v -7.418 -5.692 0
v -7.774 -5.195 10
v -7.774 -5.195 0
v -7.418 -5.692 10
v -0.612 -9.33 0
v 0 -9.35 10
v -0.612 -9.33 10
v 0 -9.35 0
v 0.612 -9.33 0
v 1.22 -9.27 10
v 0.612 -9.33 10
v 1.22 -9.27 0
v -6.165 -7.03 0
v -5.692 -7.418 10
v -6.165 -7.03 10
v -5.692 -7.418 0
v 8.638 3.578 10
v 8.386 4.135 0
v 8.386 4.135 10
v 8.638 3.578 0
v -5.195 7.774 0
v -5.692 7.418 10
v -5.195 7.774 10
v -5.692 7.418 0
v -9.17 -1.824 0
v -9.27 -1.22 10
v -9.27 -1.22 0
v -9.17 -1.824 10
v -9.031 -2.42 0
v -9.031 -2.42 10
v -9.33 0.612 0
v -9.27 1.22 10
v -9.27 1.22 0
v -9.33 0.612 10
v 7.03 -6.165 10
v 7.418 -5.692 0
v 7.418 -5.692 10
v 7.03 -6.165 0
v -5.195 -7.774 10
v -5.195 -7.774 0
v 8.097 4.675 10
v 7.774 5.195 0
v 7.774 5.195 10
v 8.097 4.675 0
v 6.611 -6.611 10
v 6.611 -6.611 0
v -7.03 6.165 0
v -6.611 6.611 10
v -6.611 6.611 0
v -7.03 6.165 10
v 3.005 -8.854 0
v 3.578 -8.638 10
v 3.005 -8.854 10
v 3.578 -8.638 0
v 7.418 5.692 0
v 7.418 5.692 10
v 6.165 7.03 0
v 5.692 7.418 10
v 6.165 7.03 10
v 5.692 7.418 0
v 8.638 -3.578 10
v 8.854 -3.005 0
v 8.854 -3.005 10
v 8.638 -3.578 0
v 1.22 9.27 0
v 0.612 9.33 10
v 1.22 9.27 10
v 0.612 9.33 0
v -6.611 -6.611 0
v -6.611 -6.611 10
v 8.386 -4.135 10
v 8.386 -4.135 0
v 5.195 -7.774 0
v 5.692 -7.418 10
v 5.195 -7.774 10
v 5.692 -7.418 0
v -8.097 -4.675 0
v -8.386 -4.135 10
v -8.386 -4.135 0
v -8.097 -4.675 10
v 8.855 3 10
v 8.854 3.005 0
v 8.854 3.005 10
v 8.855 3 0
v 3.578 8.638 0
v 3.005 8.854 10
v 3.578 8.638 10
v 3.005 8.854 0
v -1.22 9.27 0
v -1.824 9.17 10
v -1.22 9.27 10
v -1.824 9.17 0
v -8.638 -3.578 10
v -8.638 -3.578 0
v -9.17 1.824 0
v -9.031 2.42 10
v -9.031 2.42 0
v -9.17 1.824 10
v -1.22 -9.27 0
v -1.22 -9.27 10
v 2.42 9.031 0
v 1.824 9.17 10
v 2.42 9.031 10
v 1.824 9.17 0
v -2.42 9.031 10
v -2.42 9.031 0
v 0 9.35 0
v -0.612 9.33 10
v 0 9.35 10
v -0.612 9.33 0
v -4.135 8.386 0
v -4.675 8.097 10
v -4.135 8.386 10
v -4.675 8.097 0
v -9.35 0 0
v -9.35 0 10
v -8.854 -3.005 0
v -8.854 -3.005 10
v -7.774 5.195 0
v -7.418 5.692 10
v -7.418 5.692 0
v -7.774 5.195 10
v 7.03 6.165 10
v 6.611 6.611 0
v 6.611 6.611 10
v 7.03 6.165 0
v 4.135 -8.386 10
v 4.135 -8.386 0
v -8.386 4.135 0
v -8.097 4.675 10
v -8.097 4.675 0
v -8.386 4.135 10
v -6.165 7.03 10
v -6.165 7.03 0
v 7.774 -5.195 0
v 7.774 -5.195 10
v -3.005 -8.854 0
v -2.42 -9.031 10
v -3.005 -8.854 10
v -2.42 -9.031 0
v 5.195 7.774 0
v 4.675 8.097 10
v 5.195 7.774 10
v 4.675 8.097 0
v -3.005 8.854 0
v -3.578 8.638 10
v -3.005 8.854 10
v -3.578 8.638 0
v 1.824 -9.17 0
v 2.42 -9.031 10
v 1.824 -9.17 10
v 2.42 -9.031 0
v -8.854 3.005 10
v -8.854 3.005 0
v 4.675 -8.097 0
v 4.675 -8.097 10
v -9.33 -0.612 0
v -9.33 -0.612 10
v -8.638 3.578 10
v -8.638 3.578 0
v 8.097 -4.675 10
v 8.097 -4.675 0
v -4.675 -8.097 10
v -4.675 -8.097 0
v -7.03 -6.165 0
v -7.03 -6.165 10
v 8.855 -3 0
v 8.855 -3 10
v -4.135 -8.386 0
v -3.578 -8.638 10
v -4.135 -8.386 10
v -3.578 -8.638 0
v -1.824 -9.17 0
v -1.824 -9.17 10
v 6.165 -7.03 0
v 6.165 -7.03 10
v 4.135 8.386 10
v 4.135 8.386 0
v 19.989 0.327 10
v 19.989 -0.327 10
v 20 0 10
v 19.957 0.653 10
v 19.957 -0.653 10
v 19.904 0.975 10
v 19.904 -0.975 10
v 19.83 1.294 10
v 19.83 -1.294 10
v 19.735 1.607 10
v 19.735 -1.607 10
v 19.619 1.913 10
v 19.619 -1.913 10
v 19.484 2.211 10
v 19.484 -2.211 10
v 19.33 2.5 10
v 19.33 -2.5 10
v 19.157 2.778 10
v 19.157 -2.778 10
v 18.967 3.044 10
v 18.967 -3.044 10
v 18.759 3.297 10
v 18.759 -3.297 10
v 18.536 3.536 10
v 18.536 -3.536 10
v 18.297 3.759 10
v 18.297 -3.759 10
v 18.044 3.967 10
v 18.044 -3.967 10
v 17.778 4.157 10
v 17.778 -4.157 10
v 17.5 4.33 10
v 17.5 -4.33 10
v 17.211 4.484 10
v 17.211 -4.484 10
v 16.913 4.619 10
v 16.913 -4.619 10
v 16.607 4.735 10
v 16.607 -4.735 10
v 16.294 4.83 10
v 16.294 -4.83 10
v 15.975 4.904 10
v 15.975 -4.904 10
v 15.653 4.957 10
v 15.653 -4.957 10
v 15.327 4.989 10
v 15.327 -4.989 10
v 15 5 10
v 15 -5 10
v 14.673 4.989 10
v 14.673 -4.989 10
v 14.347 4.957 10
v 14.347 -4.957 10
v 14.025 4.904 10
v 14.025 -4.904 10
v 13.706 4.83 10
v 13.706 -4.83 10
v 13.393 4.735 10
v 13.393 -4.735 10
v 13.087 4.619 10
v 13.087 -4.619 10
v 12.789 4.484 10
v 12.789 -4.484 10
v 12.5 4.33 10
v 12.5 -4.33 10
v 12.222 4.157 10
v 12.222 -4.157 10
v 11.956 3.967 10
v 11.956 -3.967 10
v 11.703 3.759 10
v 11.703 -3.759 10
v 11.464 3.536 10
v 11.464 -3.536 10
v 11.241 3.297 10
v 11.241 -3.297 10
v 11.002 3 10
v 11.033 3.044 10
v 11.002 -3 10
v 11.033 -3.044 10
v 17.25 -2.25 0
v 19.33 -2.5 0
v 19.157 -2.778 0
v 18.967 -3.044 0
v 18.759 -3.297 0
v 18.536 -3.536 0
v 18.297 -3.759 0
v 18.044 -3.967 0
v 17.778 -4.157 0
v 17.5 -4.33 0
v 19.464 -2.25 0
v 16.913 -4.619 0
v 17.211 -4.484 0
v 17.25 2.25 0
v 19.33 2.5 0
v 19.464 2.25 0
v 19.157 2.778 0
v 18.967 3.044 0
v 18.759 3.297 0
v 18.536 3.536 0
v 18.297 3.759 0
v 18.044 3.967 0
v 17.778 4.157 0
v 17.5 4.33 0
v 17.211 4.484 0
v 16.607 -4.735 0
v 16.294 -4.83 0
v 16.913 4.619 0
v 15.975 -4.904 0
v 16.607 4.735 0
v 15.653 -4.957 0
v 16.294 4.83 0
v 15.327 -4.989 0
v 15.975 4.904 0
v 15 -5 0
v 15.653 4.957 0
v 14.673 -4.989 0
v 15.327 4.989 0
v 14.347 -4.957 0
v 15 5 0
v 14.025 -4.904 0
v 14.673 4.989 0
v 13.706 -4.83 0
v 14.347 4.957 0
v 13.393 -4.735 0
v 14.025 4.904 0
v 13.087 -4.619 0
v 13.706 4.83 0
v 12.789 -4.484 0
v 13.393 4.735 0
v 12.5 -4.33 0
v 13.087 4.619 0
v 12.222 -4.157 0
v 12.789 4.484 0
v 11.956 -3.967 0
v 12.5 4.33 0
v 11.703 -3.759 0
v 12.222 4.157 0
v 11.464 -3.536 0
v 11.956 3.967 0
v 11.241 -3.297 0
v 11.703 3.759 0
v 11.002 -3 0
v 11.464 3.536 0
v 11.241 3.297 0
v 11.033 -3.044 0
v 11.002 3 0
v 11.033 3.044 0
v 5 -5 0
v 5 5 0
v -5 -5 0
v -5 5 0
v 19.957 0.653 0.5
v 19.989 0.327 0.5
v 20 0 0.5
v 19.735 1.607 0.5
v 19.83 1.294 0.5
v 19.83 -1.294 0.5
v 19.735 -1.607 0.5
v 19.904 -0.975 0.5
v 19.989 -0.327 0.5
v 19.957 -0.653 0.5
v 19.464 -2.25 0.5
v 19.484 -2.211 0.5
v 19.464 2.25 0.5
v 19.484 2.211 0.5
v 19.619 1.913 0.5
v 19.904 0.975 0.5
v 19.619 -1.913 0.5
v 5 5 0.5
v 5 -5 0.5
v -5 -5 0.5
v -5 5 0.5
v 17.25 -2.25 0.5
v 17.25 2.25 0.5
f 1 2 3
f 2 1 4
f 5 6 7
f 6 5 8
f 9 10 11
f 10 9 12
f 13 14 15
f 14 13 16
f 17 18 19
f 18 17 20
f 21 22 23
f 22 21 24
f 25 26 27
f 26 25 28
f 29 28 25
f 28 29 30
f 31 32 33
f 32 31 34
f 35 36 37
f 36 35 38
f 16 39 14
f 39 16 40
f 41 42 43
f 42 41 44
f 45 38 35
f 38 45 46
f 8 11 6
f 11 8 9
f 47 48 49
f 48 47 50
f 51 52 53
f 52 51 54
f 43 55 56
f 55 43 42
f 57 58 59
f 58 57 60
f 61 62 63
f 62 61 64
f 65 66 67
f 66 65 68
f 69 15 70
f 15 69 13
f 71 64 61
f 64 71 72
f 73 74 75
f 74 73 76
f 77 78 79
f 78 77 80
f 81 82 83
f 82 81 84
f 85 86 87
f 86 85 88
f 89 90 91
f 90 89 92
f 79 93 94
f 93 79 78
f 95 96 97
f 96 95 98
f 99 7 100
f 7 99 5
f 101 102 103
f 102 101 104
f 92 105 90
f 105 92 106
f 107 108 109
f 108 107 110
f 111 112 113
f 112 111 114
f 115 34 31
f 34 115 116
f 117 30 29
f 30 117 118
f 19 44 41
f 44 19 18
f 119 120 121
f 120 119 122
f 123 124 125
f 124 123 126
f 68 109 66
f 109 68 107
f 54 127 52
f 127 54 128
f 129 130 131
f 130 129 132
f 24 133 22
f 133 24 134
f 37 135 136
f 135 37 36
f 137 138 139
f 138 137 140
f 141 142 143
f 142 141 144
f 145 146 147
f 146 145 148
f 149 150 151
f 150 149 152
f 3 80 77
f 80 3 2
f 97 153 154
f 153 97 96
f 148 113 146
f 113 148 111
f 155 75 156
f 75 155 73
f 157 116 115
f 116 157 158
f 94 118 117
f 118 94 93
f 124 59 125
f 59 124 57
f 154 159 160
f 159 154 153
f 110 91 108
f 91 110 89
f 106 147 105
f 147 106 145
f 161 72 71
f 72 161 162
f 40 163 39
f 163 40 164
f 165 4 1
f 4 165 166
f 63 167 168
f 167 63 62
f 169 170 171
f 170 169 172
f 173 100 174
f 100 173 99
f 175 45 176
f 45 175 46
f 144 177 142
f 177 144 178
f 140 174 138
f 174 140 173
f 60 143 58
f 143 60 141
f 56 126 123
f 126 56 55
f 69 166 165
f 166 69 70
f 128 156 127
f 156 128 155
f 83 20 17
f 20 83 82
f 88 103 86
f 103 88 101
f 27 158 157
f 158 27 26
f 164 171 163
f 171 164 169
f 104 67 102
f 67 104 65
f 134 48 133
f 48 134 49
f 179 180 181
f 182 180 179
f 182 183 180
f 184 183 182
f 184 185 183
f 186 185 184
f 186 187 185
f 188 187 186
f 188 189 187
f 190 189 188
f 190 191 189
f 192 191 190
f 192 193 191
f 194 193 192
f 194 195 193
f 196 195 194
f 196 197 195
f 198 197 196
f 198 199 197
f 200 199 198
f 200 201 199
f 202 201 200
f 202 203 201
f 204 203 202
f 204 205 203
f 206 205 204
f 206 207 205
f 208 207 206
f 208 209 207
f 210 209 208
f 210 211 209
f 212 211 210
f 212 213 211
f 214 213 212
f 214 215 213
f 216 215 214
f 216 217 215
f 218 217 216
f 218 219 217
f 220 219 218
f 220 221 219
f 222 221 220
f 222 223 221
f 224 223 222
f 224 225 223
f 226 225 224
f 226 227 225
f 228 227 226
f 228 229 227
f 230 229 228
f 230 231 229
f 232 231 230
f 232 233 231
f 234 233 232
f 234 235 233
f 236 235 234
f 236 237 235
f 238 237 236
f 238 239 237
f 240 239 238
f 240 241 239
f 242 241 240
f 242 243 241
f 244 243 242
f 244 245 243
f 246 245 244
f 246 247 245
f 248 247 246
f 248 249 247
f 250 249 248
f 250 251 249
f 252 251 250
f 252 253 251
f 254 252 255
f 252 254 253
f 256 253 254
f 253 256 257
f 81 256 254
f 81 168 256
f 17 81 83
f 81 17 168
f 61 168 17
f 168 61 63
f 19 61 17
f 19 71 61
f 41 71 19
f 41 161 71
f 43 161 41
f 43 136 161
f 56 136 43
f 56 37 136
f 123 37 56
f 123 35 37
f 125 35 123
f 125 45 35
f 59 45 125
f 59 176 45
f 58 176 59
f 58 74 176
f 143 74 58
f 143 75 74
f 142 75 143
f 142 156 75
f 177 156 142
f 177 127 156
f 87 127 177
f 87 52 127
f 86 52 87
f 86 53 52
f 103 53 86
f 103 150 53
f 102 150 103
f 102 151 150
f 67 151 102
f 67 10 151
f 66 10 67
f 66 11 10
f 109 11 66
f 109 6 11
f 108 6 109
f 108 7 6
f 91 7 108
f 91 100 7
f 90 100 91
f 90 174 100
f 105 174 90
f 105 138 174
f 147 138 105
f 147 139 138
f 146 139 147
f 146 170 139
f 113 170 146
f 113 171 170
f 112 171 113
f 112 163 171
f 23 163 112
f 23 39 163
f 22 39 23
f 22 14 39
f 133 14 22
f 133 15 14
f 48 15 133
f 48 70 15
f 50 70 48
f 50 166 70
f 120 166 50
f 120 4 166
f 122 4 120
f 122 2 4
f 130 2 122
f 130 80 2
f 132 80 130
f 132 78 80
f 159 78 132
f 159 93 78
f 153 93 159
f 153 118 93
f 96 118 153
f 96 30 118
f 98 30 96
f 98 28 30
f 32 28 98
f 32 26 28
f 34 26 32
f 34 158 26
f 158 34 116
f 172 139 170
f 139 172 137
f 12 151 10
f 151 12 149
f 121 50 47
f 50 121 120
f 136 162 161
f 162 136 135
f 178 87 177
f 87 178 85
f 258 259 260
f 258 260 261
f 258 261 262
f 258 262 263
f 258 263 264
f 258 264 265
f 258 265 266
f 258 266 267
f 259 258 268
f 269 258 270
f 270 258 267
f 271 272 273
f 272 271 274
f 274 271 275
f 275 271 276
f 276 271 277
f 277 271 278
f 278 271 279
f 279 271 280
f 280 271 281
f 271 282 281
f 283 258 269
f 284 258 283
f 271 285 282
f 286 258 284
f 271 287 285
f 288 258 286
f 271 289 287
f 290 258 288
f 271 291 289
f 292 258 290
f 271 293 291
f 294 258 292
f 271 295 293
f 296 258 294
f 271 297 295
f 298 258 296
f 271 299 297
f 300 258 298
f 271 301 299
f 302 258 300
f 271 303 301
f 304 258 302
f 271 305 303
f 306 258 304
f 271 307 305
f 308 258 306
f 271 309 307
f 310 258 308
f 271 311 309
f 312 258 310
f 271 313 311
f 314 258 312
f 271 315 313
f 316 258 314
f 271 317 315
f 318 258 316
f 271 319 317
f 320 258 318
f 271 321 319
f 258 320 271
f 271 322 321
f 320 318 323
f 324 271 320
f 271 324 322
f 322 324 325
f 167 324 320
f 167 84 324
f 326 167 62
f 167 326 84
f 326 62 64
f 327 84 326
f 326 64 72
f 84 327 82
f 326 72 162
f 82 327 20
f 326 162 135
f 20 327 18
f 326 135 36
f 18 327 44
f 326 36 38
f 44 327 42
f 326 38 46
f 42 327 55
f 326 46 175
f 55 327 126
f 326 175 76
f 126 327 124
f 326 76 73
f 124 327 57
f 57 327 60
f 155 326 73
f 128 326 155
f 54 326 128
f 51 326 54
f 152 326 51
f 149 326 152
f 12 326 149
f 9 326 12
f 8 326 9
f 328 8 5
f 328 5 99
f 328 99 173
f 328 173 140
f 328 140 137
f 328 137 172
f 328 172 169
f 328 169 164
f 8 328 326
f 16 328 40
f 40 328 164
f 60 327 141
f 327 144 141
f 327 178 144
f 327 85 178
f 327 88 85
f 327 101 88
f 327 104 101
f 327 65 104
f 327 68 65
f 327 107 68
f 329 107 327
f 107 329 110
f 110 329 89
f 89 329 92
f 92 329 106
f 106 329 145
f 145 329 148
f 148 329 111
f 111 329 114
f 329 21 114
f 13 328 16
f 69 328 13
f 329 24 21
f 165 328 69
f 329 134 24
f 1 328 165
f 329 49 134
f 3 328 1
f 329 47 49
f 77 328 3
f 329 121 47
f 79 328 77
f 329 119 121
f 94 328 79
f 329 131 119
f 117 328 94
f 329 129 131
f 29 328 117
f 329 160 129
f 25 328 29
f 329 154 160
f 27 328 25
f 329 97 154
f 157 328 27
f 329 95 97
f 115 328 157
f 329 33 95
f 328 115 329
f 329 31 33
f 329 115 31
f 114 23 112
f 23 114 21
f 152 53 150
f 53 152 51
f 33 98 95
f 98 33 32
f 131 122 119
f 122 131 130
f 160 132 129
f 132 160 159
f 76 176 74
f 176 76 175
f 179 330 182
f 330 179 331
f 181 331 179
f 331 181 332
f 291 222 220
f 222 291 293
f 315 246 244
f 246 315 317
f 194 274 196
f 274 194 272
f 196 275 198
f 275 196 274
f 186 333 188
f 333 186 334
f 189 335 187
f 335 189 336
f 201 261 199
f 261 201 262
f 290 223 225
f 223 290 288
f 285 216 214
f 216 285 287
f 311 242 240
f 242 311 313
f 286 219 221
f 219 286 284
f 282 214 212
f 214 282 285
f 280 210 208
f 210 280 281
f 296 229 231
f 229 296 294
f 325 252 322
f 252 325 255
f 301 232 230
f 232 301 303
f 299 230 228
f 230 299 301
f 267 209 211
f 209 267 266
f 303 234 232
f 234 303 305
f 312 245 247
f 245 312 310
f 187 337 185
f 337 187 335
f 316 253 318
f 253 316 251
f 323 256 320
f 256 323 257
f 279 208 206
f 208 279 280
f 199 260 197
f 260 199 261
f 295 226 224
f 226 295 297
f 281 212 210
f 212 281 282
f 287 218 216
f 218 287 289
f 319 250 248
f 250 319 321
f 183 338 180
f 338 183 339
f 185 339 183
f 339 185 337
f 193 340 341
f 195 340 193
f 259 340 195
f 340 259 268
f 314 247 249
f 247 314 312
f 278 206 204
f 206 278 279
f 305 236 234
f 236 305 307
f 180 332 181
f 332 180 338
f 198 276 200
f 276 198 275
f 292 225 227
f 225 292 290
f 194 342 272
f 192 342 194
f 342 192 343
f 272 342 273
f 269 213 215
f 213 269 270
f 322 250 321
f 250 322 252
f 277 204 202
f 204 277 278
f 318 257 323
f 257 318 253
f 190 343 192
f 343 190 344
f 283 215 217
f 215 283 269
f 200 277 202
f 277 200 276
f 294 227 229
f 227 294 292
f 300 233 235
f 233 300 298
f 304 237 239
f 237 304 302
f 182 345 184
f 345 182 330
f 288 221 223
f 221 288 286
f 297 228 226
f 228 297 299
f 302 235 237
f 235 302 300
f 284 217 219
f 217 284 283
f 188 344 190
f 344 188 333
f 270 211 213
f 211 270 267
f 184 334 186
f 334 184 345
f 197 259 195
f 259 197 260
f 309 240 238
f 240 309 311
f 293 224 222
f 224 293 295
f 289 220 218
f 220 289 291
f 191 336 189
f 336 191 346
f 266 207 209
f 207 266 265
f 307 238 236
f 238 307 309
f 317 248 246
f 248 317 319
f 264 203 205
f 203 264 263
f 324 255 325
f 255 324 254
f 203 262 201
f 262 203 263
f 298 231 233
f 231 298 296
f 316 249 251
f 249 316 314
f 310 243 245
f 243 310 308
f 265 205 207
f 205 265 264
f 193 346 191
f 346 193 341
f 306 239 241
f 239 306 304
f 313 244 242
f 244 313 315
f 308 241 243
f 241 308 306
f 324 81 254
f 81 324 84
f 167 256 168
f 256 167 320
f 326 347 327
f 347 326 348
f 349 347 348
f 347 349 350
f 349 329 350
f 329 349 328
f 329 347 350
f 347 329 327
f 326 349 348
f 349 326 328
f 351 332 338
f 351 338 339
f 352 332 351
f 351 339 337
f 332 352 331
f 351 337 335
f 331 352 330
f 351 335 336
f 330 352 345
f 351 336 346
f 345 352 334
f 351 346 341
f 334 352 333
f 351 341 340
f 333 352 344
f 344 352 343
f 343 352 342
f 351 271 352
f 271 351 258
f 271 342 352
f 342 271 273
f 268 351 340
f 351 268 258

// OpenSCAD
// Tubing and stand-rod snap-on clip (printed flat)
// Units: mm. Stand rod 12.7 mm (1/2 inch).

$fn = 96;

// ---- Stand rod ring ----
rod_id     = 12.7;   // rod inner diameter
rod_wall   = 3;       // ring wall thickness
rod_od     = rod_id + 2 * rod_wall;   // 18.7 mm outer diameter
rod_open   = 10;      // width of opening cut on -X side

// ---- Tubing ring ----
tube_id    = 6;       // tubing inner diameter
tube_wall  = 2;       // ring wall thickness
tube_od    = tube_id + 2 * tube_wall; // 10 mm outer diameter
tube_x     = 15;      // tubing ring centre X
tube_open  = 4.5;     // width of opening cut on +X side

// ---- Bridge ----
bridge_w   = 6;       // bridge width (Y)
bridge_x1  = 8;       // bridge left X
bridge_x2  = 12;      // bridge right X

// ---- Cut overlap ----
eps        = 0.5;     // extension past faces to avoid coplanar surfaces

difference() {
    union() {
        // Rod ring
        cylinder(d = rod_od, h = 10, $fn = 96);
        // Tubing ring
        translate([tube_x, 0, 0])
            cylinder(d = tube_od, h = 10, $fn = 96);
        // Solid bridge
        translate([bridge_x1, -bridge_w / 2, 0])
            cube([bridge_x2 - bridge_x1, bridge_w, 10]);
    }

    // Opening in rod ring: x < 0 and -5 < y < 5
    translate([-rod_open / 2, -5, -eps])
        cube([rod_open, 10, 2 * eps]);

    // Opening in tubing ring: x > 15 and -2.25 < y < 2.25
    translate([tube_x + tube_open / 2, -tube_open / 2, -eps])
        cube([tube_open, tube_open, 2 * eps]);
}
